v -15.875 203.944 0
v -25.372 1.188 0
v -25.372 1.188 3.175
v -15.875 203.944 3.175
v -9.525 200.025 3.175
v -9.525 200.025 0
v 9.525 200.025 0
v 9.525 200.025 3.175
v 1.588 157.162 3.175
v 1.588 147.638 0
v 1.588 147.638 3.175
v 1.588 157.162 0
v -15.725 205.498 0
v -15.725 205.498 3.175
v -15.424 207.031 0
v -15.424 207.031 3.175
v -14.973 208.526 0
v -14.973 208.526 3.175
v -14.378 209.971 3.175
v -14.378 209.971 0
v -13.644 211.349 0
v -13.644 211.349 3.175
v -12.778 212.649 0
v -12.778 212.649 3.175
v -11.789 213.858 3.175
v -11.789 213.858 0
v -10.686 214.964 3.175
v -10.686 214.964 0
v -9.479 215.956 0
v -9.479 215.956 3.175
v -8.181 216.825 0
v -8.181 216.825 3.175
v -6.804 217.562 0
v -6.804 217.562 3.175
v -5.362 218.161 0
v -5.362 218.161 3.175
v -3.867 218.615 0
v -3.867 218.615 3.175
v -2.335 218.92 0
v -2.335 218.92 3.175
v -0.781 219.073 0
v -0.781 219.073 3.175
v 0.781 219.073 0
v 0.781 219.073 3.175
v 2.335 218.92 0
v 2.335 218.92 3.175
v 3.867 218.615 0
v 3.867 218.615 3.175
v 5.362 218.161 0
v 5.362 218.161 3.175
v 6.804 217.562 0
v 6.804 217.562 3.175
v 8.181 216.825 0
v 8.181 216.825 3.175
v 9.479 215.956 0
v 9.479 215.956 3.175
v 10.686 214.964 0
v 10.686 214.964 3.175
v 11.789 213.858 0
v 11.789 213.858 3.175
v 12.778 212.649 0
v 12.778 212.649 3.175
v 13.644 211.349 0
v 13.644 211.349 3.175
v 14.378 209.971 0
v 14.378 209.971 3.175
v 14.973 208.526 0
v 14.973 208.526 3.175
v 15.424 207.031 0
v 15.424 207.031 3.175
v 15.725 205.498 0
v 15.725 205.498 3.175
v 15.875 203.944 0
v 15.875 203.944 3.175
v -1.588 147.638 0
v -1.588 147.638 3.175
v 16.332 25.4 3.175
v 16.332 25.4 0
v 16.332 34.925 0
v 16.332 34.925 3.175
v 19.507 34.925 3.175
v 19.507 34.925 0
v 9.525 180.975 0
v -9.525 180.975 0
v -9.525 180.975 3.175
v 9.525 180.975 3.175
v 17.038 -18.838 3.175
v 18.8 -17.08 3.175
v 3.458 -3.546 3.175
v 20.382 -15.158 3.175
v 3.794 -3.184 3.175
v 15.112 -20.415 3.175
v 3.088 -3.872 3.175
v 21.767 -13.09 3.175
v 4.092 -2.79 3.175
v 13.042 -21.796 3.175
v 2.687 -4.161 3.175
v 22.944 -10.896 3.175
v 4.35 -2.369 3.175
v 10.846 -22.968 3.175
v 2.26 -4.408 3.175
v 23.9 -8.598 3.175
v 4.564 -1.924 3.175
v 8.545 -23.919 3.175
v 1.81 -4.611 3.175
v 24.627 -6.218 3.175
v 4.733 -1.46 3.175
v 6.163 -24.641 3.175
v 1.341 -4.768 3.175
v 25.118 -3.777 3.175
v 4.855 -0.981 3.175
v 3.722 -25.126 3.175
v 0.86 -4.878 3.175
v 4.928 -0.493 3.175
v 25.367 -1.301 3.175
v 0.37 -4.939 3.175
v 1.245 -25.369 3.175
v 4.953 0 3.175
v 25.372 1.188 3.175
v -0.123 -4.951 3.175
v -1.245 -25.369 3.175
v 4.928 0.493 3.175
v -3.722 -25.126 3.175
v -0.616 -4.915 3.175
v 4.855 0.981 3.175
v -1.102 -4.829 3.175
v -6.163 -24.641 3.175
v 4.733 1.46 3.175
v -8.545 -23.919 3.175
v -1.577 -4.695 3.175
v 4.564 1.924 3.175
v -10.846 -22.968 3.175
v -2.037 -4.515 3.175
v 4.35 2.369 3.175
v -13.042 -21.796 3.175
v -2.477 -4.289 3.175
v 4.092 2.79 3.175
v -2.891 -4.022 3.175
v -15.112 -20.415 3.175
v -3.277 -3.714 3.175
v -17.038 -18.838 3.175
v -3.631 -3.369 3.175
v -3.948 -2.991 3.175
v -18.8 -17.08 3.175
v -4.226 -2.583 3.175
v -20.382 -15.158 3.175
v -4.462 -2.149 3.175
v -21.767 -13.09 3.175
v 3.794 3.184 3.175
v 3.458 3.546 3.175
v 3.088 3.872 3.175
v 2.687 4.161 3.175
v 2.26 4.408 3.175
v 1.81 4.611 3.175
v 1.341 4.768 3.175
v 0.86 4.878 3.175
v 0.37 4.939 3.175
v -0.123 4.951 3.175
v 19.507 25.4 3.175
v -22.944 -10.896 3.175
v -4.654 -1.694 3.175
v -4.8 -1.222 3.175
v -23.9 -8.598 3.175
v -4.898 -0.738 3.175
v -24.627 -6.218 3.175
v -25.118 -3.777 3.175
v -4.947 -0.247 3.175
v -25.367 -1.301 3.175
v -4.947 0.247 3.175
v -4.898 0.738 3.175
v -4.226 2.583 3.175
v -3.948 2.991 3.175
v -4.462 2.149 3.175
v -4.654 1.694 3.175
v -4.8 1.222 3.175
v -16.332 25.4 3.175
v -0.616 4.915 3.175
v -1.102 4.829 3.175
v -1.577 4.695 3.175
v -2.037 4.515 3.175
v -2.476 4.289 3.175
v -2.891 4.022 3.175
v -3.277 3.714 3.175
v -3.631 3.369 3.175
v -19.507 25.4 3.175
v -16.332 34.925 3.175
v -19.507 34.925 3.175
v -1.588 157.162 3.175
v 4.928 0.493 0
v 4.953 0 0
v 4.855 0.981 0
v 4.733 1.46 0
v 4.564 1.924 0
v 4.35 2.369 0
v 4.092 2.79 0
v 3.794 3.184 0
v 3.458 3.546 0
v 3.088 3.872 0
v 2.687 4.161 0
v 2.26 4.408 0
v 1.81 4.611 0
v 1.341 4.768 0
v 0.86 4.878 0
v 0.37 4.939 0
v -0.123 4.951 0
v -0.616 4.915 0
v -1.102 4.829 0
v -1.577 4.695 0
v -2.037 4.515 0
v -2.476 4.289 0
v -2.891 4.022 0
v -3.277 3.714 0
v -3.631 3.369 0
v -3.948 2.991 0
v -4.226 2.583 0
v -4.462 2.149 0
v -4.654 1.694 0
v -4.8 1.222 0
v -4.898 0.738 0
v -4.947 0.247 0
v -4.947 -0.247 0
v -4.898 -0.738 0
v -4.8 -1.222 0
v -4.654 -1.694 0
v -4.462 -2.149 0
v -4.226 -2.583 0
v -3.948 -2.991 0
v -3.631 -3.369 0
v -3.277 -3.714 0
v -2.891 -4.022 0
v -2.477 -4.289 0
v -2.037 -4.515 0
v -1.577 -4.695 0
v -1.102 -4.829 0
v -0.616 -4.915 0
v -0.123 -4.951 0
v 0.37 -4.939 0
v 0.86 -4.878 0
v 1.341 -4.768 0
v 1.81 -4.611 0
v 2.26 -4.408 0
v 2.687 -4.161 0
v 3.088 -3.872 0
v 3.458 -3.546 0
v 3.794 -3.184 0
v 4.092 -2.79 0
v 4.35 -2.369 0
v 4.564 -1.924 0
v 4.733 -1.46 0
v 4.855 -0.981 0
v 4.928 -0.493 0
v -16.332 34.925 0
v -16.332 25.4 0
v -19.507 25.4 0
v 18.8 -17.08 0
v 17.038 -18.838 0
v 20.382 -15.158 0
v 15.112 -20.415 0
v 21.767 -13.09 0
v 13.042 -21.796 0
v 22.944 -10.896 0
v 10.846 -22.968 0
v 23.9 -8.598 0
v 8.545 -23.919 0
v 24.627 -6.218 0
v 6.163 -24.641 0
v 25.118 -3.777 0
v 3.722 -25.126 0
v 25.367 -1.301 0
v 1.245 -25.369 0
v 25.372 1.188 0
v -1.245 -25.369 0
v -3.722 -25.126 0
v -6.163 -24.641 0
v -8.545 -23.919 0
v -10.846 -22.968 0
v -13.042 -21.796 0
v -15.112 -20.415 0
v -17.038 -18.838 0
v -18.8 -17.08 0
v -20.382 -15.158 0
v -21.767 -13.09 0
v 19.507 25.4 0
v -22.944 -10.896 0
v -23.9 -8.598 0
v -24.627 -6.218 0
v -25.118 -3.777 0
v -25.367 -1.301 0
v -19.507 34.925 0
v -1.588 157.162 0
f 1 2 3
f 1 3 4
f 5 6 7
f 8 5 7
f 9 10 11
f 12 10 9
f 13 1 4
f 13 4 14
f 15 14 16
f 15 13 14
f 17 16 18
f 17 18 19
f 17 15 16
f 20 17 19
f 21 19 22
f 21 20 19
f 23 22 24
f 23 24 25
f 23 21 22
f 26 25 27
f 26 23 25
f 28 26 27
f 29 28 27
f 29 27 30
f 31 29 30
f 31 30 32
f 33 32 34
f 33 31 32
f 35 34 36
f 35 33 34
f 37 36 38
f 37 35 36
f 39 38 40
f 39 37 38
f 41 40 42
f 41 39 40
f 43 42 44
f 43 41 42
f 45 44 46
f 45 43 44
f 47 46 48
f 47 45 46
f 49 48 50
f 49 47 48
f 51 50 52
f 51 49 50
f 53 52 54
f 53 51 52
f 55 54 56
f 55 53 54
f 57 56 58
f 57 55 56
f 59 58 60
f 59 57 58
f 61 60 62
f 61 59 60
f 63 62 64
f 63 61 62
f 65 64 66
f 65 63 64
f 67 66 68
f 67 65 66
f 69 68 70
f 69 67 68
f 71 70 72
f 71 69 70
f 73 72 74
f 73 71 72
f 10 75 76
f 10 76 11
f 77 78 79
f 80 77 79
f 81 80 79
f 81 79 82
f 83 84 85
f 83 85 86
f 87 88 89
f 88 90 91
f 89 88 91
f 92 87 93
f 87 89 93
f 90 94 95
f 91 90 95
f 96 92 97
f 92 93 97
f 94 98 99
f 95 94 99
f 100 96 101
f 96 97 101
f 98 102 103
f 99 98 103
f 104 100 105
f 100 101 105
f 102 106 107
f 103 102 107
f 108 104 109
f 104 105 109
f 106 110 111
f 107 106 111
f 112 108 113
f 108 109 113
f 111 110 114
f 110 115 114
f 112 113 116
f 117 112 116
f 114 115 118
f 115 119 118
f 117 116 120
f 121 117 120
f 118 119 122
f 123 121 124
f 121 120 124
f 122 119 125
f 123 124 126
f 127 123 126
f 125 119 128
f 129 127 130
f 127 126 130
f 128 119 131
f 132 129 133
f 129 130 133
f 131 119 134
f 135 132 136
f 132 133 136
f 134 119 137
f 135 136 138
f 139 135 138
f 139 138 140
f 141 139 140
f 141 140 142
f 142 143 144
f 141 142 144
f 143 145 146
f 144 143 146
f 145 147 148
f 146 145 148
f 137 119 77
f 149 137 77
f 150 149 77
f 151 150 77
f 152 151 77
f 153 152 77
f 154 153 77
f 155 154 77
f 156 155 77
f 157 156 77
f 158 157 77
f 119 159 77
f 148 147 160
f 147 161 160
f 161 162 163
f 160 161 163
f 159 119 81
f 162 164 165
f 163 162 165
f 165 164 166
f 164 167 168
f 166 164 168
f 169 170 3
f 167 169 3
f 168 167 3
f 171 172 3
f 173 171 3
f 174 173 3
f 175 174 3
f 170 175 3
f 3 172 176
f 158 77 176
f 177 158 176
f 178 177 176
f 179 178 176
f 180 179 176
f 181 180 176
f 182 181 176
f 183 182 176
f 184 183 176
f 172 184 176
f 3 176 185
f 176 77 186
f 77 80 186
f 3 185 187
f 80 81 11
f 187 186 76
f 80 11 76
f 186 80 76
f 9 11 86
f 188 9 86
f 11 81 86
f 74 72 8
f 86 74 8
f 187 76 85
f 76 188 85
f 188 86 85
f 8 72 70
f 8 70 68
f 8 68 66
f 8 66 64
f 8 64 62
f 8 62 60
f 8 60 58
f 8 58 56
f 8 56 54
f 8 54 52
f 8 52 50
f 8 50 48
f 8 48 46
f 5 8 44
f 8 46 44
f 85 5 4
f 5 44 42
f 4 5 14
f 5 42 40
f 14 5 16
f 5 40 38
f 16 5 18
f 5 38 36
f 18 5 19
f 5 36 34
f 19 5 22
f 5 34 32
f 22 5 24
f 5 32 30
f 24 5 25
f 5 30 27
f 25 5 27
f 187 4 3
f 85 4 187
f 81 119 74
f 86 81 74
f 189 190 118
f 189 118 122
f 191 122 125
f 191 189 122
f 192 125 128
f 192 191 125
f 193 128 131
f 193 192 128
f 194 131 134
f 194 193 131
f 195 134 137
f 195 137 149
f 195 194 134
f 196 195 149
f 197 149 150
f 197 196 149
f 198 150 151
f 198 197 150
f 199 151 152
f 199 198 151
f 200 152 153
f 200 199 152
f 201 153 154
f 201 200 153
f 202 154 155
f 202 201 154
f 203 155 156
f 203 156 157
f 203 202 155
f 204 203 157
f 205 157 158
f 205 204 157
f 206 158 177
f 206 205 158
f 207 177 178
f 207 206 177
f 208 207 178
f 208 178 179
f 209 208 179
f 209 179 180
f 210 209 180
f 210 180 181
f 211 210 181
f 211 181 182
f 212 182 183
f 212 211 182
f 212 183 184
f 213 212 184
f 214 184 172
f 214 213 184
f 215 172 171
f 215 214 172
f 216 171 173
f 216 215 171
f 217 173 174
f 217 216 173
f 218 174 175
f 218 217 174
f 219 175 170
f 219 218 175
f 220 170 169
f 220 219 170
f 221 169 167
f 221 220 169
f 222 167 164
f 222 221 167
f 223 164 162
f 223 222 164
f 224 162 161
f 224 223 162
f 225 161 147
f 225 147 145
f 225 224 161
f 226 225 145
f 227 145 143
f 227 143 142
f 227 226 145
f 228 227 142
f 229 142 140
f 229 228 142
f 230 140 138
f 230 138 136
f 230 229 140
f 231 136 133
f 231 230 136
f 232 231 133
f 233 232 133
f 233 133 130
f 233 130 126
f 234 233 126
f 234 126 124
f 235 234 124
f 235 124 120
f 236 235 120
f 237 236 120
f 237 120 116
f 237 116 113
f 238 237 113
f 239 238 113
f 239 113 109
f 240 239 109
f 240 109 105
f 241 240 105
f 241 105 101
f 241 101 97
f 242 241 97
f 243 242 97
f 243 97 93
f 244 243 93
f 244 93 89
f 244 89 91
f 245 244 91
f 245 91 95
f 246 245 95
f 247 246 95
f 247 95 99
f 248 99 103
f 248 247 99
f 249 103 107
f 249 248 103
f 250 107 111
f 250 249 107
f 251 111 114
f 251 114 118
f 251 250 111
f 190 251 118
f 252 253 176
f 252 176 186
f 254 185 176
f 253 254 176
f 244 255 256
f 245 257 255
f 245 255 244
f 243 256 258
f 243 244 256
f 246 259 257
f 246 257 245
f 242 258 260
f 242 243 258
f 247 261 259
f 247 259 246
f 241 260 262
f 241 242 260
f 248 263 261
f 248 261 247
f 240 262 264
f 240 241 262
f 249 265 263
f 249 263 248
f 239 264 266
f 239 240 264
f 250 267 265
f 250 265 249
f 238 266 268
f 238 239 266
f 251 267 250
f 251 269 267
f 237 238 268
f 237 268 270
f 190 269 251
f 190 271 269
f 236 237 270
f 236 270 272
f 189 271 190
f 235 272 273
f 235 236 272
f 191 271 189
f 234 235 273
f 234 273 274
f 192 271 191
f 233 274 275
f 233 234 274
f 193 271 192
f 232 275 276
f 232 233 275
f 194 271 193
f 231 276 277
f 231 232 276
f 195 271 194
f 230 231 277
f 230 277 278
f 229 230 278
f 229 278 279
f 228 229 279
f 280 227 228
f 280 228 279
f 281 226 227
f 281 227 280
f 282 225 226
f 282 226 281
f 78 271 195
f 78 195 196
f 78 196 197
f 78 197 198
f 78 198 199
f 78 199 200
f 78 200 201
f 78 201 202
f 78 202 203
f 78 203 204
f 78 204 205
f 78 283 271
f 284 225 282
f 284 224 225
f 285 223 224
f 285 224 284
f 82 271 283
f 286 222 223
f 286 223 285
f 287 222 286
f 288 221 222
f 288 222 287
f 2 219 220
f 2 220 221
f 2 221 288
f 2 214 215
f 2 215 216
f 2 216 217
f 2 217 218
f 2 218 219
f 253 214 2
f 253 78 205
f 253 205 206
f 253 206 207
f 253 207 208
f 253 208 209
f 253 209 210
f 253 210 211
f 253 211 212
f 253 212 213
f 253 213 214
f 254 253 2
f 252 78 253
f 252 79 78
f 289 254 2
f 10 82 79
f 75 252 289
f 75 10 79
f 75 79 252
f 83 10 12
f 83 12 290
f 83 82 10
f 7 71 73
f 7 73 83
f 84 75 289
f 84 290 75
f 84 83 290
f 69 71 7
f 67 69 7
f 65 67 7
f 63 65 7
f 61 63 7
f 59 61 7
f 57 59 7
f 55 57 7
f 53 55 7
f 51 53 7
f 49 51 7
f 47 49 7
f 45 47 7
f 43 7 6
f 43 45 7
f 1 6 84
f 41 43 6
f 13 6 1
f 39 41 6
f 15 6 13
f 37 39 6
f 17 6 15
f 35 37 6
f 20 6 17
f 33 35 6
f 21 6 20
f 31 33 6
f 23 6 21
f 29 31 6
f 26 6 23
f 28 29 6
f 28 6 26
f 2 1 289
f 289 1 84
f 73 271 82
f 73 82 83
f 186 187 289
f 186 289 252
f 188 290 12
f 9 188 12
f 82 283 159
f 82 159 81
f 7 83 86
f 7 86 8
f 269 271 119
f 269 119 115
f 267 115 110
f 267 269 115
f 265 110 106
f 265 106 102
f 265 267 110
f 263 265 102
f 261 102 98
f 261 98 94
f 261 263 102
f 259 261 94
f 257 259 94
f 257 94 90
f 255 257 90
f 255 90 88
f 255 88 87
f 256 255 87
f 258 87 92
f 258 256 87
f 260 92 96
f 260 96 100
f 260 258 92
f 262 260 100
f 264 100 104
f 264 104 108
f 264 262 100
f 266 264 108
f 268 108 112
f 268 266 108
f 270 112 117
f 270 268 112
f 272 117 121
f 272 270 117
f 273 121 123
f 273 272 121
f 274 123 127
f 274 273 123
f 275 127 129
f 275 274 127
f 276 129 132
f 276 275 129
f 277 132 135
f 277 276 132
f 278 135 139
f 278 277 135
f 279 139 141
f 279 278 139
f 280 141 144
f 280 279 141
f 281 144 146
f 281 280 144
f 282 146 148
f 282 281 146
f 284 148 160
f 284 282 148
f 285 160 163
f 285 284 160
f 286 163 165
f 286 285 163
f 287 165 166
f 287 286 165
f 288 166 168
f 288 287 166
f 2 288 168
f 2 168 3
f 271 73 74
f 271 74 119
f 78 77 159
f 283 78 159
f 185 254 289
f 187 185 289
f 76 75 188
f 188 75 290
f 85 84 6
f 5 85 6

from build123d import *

# Parameters (mm, degrees)
SKETCH1_R           = 4.953
SKETCH1_W           = 3.175
SKETCH1_H           = 9.525
SKETCH1_W_2         = 19.05
SKETCH1_H_2         = 19.05
BOSS_EXTRUDE1_DEPTH = 3.175


with BuildPart() as part:
    # Sketch1 → Boss-Extrude1 (new body)
    with BuildSketch(Plane.XY):
        with BuildLine():
            Line((-25.372181386, 1.188449288), (-15.875, 203.943595206))
            ThreePointArc((-15.875, 203.943595206), (0, 219.092405697), (15.875, 203.943595206))
            Line((15.875, 203.943595206), (25.372181386, 1.188449288))
            ThreePointArc((25.372181386, 1.188449288), (0, -25.4), (-25.372181386, 1.188449288))
        make_face()
        Circle(SKETCH1_R, mode=Mode.SUBTRACT)
        with Locations((-17.9197, 30.1625)):
            Rectangle(SKETCH1_W, SKETCH1_H, mode=Mode.SUBTRACT)
        with Locations((0, 152.4)):
            Rectangle(SKETCH1_W, SKETCH1_H, mode=Mode.SUBTRACT)
        with Locations((17.9197, 30.1625)):
            Rectangle(SKETCH1_W, SKETCH1_H, mode=Mode.SUBTRACT)
        with Locations((0, 190.5)):
            Rectangle(SKETCH1_W_2, SKETCH1_H_2, mode=Mode.SUBTRACT)
    extrude(amount=BOSS_EXTRUDE1_DEPTH)


solid = part.part
